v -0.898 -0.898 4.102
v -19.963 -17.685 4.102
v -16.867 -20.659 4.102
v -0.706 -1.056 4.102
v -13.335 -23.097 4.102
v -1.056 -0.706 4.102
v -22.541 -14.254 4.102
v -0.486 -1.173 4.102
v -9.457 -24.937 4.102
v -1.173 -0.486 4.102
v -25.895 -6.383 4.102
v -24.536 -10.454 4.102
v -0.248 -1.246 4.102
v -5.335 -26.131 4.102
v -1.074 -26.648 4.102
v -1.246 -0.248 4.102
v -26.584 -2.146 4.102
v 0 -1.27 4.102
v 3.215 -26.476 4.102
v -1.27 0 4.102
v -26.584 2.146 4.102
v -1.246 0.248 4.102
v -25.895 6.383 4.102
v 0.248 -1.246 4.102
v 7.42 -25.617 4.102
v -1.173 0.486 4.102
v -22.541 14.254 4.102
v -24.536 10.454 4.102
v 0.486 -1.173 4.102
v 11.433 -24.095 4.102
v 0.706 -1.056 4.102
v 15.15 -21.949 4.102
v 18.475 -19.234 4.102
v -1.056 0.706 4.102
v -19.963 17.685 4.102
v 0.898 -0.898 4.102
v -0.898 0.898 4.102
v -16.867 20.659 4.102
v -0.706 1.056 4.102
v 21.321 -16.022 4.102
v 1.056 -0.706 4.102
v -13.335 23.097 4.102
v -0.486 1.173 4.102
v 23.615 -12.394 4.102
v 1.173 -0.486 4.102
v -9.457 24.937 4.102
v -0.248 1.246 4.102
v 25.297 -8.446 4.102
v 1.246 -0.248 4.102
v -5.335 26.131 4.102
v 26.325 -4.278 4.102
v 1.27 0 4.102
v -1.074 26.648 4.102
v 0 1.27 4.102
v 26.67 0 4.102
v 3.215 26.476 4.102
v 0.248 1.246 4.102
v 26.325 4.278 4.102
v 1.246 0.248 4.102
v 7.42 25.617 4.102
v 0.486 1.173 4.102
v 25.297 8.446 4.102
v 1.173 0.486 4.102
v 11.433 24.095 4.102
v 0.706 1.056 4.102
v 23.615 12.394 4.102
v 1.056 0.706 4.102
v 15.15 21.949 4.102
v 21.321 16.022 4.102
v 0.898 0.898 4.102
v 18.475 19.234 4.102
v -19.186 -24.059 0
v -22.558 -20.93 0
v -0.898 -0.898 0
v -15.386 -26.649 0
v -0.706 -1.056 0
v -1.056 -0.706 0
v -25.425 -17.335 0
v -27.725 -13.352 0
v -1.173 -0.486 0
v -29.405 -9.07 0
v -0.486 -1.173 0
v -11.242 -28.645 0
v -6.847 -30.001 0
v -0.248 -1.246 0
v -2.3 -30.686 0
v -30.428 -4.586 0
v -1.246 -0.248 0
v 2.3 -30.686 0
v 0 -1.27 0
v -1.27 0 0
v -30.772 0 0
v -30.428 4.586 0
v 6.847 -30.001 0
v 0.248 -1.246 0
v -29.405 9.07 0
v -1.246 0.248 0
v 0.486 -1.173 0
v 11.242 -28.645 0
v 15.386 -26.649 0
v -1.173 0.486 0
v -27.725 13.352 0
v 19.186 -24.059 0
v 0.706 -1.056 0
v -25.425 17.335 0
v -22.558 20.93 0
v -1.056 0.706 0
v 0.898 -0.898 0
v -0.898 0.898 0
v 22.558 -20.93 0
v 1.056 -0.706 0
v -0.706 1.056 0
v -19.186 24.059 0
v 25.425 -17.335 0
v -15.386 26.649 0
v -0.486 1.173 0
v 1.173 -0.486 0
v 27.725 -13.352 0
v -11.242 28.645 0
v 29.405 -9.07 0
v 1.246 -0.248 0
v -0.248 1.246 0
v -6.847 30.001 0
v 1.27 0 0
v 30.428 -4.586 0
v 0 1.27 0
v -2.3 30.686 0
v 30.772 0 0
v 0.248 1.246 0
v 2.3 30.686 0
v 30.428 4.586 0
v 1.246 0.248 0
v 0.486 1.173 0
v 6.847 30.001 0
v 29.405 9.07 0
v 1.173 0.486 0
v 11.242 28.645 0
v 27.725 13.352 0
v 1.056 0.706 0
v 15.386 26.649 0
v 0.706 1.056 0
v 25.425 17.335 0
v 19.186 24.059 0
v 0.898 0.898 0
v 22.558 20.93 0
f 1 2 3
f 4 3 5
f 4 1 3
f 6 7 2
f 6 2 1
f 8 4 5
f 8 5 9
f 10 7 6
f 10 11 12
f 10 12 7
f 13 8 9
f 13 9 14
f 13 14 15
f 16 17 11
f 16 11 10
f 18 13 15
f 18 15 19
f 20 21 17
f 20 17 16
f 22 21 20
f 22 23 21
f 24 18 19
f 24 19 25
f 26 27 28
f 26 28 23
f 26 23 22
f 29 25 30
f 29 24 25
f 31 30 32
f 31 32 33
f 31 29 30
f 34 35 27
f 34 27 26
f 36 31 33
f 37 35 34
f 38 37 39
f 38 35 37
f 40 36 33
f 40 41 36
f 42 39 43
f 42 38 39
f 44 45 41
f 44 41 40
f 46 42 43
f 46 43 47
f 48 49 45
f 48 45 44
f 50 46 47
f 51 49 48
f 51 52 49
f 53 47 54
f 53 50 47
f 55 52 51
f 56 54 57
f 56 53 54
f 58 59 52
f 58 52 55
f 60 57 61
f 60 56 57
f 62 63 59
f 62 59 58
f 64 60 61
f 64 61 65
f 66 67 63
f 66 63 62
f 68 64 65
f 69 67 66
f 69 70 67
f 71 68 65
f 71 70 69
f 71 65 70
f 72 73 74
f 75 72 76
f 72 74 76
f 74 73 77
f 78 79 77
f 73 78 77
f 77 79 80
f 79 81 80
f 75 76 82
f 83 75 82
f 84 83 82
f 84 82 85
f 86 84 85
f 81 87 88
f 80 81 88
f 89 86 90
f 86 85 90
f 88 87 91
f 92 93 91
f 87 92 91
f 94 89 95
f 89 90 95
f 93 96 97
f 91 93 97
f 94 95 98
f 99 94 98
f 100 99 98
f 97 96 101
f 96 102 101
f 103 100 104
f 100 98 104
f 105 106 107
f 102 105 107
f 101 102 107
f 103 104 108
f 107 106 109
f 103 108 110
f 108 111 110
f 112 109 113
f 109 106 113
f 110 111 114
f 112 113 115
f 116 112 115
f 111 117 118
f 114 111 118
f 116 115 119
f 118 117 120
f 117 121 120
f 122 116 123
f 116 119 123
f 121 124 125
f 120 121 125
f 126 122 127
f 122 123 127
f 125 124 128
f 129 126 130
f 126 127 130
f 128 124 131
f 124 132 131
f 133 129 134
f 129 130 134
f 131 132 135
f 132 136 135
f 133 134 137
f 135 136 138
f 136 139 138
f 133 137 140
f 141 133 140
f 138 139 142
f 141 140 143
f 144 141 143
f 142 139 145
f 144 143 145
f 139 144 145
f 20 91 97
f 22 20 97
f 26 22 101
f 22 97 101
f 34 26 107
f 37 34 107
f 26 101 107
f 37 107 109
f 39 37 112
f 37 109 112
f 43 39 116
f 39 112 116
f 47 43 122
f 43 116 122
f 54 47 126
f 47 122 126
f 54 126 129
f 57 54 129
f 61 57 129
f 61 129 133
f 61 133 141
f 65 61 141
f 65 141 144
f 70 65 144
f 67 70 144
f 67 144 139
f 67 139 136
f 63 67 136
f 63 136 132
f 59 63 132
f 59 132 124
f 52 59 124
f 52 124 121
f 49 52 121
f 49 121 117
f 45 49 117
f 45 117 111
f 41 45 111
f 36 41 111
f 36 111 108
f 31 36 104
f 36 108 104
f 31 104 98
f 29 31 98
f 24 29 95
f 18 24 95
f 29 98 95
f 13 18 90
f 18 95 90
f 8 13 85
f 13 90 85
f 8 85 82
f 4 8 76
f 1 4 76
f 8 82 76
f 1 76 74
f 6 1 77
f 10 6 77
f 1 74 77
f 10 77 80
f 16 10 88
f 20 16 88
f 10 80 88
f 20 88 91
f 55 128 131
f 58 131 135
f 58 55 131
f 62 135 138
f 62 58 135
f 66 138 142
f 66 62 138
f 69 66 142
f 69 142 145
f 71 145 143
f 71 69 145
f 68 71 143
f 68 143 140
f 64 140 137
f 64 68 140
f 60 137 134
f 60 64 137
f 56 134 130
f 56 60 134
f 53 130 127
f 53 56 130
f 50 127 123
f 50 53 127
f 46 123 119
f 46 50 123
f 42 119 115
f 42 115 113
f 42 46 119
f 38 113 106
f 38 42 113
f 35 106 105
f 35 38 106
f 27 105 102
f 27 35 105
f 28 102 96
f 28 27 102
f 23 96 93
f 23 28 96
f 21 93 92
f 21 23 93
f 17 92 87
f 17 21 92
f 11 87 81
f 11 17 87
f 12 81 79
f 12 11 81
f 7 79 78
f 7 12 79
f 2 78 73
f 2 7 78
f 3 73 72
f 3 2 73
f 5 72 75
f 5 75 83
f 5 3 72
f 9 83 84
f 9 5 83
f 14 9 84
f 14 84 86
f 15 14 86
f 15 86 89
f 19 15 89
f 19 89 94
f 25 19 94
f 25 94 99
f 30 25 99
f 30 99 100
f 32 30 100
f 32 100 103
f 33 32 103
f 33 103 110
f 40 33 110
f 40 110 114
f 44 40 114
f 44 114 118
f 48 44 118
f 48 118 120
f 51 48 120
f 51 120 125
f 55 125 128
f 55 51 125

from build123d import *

# Parameters (mm, degrees)
F0_R     = 31.75
F1_DEPTH = 4.1021592915
F5_D     = 2.54


# Not quite as in the source:
# - a fillet or chamfer that OpenCascade refuses, or shapes differently, is made with other operations: its cross-section is extruded or revolved along the edge and cut away or added
# - the program builds the solid bodies; features that only make, move or delete a surface that nothing else refers to are left out


with BuildPart() as f1:
    # F0 (on Top) → F1 (new body)
    with BuildSketch(Plane.XY):
        Circle(F0_R)
    extrude(amount=F1_DEPTH)

    # F2: chamfer of 5.08 on 1 edges, made by hand

    # F2_s1 → F2_t2 (revolve, cut)
    with BuildSketch(Plane.XZ):
        Polygon((31.75, -0.9778407085), (26.67, 4.1021592915), (31.75, 4.1021592915), align=None)
    revolve(axis=Axis((0, 0, 4.1021592915), (0, 0, 1)), mode=Mode.SUBTRACT)

    # F5 (through all)
    with Locations(Plane.XY.offset(4.1021592915)):
        with Locations((0, 0)):
            Hole(F5_D / 2)


solid = f1.part
